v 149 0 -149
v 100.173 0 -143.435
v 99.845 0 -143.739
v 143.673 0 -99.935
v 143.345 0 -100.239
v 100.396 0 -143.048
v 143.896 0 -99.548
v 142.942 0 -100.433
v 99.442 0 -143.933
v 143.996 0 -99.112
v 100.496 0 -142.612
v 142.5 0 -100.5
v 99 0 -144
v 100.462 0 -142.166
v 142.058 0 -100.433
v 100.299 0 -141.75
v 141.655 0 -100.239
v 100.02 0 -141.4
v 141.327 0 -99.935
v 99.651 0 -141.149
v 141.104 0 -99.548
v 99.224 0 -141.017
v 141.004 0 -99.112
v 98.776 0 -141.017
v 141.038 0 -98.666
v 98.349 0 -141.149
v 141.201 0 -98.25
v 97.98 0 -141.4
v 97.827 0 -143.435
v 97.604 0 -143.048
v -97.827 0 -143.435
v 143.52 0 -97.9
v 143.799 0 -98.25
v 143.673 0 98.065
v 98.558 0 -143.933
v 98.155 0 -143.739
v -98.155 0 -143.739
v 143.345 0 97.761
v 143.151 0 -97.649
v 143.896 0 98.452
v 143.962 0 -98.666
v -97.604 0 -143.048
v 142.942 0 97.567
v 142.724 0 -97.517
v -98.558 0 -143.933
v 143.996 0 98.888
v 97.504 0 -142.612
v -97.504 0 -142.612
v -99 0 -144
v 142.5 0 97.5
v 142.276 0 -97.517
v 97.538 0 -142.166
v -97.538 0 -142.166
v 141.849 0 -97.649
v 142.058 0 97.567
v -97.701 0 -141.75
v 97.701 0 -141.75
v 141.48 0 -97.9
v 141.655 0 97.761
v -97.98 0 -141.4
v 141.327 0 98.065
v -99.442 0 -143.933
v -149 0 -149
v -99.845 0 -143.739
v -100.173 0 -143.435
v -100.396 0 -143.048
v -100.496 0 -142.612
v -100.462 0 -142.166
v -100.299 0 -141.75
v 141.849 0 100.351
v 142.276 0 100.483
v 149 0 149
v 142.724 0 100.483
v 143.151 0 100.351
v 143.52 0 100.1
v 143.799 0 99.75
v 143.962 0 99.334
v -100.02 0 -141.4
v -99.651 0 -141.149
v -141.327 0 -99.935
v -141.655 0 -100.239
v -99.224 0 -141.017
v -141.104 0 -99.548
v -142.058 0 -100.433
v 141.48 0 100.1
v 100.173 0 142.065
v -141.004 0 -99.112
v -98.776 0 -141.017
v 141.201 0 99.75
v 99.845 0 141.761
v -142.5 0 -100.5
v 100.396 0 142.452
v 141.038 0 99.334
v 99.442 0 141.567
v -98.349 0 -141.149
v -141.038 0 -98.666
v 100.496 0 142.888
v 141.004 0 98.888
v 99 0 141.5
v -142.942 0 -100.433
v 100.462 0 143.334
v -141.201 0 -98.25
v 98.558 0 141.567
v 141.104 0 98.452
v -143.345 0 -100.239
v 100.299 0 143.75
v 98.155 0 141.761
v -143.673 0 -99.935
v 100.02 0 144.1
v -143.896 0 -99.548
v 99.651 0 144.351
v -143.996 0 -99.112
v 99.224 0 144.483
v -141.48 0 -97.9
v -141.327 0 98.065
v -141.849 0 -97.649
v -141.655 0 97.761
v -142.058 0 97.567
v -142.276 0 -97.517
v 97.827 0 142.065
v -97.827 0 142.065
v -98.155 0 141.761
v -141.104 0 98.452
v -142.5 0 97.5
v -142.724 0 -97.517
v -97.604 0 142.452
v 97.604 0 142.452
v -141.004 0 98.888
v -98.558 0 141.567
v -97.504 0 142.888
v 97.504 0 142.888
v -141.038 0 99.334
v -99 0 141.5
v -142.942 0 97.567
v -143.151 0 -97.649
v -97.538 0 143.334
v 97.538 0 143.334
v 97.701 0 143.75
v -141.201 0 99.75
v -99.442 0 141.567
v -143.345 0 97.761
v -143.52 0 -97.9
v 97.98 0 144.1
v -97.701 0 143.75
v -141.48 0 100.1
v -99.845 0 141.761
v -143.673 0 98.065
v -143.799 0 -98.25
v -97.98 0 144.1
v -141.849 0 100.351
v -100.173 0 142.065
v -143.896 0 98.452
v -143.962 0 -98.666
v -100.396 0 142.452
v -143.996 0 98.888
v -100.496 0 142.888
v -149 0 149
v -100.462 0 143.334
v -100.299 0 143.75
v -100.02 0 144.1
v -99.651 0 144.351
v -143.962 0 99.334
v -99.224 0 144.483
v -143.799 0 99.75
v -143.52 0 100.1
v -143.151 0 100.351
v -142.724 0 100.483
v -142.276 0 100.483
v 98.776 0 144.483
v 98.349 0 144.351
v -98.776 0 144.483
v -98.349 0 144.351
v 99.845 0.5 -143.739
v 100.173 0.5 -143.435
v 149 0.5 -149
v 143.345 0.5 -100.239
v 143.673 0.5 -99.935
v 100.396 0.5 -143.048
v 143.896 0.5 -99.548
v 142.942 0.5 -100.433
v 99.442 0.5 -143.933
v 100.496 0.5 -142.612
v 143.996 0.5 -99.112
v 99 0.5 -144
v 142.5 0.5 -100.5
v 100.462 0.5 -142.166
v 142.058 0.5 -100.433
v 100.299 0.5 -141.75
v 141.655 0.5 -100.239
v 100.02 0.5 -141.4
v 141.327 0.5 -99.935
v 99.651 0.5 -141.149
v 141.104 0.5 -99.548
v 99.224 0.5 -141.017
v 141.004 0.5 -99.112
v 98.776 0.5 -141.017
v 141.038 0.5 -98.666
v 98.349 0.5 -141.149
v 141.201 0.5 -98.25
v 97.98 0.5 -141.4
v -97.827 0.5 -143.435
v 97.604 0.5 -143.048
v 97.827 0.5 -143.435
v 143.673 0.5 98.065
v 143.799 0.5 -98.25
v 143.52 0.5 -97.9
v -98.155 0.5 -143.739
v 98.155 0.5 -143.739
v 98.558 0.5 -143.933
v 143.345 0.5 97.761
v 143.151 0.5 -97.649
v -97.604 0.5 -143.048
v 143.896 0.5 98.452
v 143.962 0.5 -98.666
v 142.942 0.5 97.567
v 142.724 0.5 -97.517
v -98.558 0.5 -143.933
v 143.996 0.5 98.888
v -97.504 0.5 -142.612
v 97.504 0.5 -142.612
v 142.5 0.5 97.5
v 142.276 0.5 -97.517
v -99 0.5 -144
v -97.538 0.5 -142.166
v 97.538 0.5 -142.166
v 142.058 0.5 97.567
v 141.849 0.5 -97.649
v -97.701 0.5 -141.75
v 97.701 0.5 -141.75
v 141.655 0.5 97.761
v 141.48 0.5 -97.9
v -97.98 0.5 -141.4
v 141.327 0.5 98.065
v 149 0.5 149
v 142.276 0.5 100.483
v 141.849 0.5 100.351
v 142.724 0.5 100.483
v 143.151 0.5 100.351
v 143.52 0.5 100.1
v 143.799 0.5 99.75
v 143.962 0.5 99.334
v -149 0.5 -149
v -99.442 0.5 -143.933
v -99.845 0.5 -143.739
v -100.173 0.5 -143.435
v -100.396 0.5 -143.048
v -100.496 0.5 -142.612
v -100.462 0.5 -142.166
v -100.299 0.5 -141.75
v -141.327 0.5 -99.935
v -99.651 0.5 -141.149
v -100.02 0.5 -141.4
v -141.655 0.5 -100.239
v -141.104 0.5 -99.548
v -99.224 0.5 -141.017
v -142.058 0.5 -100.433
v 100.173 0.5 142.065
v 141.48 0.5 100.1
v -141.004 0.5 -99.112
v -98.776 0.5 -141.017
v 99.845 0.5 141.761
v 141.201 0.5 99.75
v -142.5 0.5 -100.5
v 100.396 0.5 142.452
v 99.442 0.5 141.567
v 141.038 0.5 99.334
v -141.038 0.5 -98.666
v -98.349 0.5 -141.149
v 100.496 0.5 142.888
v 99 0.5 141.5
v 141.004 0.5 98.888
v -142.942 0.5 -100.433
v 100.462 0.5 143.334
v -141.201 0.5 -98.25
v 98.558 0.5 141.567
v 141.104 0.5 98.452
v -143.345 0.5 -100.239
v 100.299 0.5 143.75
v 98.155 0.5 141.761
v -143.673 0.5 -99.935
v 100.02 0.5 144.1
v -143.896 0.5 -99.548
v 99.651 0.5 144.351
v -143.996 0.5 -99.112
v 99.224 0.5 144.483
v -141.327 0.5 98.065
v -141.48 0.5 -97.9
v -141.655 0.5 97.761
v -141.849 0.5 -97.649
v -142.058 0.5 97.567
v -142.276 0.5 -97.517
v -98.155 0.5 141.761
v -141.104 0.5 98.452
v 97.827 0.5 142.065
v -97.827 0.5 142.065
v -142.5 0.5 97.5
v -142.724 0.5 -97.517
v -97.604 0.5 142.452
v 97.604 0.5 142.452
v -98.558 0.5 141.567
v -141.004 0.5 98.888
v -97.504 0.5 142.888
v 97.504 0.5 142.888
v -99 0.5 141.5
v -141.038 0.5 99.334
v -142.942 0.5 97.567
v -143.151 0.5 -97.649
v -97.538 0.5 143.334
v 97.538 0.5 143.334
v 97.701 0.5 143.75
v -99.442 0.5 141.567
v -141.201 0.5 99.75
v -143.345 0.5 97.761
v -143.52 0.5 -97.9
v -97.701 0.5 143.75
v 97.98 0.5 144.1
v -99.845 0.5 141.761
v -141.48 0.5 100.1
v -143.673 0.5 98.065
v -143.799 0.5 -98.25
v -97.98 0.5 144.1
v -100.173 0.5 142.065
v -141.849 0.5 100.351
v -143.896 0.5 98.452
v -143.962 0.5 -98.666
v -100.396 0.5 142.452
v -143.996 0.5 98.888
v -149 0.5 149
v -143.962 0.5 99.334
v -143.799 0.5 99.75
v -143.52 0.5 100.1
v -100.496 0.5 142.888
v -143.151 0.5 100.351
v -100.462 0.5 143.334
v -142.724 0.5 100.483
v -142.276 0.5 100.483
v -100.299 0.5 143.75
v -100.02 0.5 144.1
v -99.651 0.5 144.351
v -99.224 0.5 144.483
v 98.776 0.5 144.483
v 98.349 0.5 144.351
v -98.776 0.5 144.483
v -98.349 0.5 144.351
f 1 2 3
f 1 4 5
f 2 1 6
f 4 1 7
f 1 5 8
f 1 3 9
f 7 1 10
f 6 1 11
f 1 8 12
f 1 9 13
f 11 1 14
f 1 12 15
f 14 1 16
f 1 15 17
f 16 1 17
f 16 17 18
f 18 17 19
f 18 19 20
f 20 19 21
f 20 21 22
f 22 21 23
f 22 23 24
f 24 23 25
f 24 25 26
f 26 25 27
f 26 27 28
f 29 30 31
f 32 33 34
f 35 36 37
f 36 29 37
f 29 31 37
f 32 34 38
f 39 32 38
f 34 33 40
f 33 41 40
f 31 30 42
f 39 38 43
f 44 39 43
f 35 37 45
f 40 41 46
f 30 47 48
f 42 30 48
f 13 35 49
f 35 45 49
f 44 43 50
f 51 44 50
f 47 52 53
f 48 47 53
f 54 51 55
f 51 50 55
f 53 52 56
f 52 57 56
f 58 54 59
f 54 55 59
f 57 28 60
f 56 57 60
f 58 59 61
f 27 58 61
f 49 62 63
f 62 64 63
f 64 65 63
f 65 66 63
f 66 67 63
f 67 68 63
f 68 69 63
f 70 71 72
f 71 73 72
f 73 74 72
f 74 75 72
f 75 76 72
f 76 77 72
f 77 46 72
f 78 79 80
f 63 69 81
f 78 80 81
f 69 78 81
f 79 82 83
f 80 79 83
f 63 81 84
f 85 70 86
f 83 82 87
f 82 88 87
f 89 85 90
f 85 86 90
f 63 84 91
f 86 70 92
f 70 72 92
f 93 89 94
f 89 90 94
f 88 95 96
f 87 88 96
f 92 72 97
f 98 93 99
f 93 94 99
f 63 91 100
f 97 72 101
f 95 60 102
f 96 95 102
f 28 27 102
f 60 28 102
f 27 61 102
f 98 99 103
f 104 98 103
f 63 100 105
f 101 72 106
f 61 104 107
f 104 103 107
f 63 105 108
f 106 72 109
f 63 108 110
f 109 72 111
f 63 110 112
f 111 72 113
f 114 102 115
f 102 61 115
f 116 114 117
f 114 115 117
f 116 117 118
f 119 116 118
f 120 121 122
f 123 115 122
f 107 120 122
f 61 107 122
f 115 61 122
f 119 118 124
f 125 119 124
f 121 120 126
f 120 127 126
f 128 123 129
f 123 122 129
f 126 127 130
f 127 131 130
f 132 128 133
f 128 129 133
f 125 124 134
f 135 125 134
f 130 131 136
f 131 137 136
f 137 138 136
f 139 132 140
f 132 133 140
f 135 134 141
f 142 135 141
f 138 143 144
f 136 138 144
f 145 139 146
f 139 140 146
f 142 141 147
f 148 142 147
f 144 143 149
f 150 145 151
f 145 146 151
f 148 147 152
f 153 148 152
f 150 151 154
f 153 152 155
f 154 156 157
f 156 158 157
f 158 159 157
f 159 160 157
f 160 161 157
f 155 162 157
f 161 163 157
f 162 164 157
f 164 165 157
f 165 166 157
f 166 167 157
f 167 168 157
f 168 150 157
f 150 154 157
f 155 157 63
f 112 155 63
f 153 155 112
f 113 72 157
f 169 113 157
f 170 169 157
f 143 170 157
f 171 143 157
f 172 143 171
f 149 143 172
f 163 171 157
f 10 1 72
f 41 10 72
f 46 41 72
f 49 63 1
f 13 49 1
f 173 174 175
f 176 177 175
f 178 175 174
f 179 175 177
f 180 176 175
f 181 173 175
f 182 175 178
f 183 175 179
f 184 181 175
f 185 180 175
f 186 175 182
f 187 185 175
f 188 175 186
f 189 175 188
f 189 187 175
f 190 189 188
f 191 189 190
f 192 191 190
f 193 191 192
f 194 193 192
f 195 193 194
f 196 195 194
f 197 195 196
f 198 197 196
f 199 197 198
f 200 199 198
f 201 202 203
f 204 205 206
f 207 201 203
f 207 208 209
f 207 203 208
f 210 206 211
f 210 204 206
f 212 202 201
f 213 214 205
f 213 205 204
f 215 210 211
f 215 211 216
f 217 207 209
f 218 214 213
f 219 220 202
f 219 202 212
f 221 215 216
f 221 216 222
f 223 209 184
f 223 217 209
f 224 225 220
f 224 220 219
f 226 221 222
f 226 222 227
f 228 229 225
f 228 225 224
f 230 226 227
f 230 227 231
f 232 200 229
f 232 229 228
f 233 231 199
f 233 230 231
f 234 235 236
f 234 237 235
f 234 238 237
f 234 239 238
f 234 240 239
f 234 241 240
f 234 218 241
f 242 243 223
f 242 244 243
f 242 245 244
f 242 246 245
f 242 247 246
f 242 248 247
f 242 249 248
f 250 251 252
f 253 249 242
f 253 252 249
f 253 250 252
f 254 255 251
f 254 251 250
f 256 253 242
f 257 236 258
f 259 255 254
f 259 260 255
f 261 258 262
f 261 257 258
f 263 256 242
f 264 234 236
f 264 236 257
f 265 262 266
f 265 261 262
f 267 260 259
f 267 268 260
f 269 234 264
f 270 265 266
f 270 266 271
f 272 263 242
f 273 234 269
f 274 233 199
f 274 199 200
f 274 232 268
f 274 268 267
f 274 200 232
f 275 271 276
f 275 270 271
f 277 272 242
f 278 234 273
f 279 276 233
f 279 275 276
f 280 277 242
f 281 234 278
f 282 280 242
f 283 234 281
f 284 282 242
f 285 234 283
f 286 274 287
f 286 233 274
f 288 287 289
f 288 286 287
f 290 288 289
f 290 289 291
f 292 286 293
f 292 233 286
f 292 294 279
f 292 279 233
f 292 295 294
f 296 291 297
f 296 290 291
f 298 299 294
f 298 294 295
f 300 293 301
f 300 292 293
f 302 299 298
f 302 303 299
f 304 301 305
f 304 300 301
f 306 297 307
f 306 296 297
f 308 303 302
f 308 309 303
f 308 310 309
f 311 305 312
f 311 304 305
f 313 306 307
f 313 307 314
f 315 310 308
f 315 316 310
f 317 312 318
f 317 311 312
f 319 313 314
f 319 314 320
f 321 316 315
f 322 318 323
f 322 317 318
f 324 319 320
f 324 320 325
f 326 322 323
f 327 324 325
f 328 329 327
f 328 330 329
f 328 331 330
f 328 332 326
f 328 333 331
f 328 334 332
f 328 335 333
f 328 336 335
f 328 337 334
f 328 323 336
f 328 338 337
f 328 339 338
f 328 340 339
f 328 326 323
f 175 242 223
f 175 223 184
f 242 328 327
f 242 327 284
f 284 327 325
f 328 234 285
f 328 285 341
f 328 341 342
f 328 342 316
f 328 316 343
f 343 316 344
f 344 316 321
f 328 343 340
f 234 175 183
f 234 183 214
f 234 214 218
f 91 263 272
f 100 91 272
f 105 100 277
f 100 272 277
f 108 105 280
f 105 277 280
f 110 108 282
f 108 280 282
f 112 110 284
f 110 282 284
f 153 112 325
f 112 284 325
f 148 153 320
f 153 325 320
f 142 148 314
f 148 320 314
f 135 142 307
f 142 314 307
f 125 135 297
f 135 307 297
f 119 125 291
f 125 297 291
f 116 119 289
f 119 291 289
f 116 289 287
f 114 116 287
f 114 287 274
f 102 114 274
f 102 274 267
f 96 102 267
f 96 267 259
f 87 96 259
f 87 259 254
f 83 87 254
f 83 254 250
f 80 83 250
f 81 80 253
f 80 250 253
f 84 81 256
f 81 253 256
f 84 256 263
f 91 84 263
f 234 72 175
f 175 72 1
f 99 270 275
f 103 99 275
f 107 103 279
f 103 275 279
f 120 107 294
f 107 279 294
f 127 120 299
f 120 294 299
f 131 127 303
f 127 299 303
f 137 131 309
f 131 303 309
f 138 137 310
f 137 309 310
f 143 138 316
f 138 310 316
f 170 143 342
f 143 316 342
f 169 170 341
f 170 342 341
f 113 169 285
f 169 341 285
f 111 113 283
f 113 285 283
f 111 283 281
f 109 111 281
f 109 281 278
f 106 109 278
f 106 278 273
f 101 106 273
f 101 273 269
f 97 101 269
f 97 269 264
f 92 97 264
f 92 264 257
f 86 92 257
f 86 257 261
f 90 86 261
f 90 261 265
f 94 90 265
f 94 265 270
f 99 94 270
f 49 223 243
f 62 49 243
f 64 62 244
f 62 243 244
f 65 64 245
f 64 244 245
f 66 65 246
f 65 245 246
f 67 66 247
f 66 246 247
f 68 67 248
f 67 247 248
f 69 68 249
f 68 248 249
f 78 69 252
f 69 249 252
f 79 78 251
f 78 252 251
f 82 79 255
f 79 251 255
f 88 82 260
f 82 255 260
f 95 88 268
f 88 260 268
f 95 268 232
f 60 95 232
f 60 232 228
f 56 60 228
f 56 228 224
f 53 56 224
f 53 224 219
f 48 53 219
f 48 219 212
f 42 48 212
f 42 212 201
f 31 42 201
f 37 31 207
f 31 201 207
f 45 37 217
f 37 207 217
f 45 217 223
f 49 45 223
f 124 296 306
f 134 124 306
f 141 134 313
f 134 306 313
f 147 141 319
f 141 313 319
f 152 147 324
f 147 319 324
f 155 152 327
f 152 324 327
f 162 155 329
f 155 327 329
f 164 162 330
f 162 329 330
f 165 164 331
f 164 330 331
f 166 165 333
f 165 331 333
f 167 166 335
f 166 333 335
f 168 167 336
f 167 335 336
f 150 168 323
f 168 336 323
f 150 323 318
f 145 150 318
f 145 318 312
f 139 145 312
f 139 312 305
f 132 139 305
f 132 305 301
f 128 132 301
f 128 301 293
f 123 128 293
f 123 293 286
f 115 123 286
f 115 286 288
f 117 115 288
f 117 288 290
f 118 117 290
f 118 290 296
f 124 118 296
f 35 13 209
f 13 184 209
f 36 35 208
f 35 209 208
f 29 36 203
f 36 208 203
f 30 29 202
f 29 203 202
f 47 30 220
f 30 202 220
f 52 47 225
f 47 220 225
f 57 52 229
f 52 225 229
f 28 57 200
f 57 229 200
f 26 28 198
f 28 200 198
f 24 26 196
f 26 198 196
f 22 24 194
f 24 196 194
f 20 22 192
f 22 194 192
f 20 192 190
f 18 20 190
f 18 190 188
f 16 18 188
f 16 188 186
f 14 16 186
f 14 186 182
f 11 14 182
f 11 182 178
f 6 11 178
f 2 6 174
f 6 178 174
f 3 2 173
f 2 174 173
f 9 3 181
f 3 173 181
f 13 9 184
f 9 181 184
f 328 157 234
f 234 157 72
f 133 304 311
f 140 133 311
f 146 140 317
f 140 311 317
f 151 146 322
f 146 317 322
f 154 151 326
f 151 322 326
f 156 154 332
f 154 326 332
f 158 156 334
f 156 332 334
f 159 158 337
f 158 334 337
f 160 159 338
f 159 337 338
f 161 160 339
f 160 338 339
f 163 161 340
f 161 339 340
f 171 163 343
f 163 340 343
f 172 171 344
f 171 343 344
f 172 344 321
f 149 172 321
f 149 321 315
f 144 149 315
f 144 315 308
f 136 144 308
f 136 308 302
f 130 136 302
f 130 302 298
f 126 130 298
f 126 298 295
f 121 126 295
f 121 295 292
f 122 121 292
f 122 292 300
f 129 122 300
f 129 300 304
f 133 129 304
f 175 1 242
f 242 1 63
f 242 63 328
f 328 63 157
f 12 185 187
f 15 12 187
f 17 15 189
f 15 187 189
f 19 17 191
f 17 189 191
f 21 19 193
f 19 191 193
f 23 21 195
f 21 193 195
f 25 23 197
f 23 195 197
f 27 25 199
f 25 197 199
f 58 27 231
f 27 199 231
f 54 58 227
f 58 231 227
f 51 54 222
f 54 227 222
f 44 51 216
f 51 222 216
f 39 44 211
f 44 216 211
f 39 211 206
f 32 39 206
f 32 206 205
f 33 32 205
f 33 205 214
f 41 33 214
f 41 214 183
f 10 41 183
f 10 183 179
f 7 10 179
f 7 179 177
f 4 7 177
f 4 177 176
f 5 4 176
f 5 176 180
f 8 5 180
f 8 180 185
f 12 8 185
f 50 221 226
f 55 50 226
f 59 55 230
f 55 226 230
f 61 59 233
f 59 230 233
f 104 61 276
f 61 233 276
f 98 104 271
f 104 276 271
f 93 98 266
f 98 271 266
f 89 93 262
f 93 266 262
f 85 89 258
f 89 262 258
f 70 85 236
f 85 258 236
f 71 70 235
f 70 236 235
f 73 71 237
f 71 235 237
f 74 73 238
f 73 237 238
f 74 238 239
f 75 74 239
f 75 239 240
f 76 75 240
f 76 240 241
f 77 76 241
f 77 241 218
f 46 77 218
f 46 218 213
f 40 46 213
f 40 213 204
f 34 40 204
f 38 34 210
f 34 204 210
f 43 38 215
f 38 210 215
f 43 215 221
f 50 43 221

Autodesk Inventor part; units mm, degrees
ref_plane "YZ Plane" through (0, 0, 0) normal (1, 0, 0) x (0, 1, 0)
ref_plane "XZ Plane" through (0, 0, 0) normal (0, 1, 0) x (-1, 0, 0)
ref_plane "XY Plane" through (0, 0, 0) normal (0, 0, 1) x (1, 0, 0)
sketch "Esboço1" plane through (0, 0, 0) normal (0, 1, 0) x (-1, 0, 0)
  line L0 (-149, -149) -> (149, -149)
  line L1 (149, -149) -> (149, 149)
  line L2 (149, 149) -> (-149, 149)
  line L3 (-149, 149) -> (-149, -149)
  line L4 (-149, -149) -> (149, 149) construction
  line L5 (149, -149) -> (-149, 149) construction
  point P0 (0, 0)
  dimension "d0" = 298
  dimension "d1" = 298
extrude "Placa1" add sketch "Esboço1" along normal blind 0.5
sketch "Esboço2" plane through (0, 0, 0) normal (0, -1, 0) x (1, 0, 0)
  line L0 (-149, 149) -> (149, 149) projected
  line L1 (149, -149) -> (-149, -149) projected
  line L2 (-149, -149) -> (-149, 149) projected
  line L3 (149, 149) -> (149, -149) projected
  point P0 (0, 0)
  point P1 (-99, 143)
  point P2 (99, 143)
  point P3 (142.5, 99)
  point P4 (142.5, -99)
  point P5 (99, -142.5)
  point P6 (-99, -142.5)
  point P7 (-142.5, -99)
  point P8 (-142.5, 99)
  dimension "d3" = 50
  dimension "d4" = 50
  dimension "d5" = 50
  dimension "d6" = 50
  dimension "d7" = 50
  dimension "d8" = 50
  dimension "d9" = 50
  dimension "d10" = 50
  dimension "d11" = 6
  dimension "d12" = 6
  dimension "d13" = 6.5
  dimension "d14" = 6.5
  dimension "d15" = 6.5
  dimension "d16" = 6.5
  dimension "d17" = 6.5
  dimension "d18" = 6.5
hole "Furo1" at (-99, 0, 143) at (99, 0, 143) at (142.5, 0, 99) at (142.5, 0, -99) at (99, 0, -142.5) at (-99, 0, -142.5) at (-142.5, 0, -99) at (-142.5, 0, 99) direction (0, 1, 0) diameter 3 end through all
equation "\"d1\" = d0"
equation "\"d24\" = Espessura"
equation "\"d2\" = Espessura"
equation "\"Raio_vergadura\" = Espessura"
equation "\"Largura_alívio_de_vergadura\" = Espessura"
equation "\"Profundidade_alívio_de_vergadura\" = 0.5 * Espessura"
equation "\"Tamanho_alívio_de_dobra\" = 4 * Espessura"
equation "\"Remanescente_mínimo\" = 2 * Espessura"
equation "\"Raiodetransição\" = Raio_vergadura"
equation "\"Tamanho_de_raio_de_Jacobi\" = Raio_vergadura"
equation "\"TamanhoFolga\" = Espessura"
equation "\"Espessura\" = 0.5"
properties part number "Fundo Gaveta" material "PMMA plástico"
